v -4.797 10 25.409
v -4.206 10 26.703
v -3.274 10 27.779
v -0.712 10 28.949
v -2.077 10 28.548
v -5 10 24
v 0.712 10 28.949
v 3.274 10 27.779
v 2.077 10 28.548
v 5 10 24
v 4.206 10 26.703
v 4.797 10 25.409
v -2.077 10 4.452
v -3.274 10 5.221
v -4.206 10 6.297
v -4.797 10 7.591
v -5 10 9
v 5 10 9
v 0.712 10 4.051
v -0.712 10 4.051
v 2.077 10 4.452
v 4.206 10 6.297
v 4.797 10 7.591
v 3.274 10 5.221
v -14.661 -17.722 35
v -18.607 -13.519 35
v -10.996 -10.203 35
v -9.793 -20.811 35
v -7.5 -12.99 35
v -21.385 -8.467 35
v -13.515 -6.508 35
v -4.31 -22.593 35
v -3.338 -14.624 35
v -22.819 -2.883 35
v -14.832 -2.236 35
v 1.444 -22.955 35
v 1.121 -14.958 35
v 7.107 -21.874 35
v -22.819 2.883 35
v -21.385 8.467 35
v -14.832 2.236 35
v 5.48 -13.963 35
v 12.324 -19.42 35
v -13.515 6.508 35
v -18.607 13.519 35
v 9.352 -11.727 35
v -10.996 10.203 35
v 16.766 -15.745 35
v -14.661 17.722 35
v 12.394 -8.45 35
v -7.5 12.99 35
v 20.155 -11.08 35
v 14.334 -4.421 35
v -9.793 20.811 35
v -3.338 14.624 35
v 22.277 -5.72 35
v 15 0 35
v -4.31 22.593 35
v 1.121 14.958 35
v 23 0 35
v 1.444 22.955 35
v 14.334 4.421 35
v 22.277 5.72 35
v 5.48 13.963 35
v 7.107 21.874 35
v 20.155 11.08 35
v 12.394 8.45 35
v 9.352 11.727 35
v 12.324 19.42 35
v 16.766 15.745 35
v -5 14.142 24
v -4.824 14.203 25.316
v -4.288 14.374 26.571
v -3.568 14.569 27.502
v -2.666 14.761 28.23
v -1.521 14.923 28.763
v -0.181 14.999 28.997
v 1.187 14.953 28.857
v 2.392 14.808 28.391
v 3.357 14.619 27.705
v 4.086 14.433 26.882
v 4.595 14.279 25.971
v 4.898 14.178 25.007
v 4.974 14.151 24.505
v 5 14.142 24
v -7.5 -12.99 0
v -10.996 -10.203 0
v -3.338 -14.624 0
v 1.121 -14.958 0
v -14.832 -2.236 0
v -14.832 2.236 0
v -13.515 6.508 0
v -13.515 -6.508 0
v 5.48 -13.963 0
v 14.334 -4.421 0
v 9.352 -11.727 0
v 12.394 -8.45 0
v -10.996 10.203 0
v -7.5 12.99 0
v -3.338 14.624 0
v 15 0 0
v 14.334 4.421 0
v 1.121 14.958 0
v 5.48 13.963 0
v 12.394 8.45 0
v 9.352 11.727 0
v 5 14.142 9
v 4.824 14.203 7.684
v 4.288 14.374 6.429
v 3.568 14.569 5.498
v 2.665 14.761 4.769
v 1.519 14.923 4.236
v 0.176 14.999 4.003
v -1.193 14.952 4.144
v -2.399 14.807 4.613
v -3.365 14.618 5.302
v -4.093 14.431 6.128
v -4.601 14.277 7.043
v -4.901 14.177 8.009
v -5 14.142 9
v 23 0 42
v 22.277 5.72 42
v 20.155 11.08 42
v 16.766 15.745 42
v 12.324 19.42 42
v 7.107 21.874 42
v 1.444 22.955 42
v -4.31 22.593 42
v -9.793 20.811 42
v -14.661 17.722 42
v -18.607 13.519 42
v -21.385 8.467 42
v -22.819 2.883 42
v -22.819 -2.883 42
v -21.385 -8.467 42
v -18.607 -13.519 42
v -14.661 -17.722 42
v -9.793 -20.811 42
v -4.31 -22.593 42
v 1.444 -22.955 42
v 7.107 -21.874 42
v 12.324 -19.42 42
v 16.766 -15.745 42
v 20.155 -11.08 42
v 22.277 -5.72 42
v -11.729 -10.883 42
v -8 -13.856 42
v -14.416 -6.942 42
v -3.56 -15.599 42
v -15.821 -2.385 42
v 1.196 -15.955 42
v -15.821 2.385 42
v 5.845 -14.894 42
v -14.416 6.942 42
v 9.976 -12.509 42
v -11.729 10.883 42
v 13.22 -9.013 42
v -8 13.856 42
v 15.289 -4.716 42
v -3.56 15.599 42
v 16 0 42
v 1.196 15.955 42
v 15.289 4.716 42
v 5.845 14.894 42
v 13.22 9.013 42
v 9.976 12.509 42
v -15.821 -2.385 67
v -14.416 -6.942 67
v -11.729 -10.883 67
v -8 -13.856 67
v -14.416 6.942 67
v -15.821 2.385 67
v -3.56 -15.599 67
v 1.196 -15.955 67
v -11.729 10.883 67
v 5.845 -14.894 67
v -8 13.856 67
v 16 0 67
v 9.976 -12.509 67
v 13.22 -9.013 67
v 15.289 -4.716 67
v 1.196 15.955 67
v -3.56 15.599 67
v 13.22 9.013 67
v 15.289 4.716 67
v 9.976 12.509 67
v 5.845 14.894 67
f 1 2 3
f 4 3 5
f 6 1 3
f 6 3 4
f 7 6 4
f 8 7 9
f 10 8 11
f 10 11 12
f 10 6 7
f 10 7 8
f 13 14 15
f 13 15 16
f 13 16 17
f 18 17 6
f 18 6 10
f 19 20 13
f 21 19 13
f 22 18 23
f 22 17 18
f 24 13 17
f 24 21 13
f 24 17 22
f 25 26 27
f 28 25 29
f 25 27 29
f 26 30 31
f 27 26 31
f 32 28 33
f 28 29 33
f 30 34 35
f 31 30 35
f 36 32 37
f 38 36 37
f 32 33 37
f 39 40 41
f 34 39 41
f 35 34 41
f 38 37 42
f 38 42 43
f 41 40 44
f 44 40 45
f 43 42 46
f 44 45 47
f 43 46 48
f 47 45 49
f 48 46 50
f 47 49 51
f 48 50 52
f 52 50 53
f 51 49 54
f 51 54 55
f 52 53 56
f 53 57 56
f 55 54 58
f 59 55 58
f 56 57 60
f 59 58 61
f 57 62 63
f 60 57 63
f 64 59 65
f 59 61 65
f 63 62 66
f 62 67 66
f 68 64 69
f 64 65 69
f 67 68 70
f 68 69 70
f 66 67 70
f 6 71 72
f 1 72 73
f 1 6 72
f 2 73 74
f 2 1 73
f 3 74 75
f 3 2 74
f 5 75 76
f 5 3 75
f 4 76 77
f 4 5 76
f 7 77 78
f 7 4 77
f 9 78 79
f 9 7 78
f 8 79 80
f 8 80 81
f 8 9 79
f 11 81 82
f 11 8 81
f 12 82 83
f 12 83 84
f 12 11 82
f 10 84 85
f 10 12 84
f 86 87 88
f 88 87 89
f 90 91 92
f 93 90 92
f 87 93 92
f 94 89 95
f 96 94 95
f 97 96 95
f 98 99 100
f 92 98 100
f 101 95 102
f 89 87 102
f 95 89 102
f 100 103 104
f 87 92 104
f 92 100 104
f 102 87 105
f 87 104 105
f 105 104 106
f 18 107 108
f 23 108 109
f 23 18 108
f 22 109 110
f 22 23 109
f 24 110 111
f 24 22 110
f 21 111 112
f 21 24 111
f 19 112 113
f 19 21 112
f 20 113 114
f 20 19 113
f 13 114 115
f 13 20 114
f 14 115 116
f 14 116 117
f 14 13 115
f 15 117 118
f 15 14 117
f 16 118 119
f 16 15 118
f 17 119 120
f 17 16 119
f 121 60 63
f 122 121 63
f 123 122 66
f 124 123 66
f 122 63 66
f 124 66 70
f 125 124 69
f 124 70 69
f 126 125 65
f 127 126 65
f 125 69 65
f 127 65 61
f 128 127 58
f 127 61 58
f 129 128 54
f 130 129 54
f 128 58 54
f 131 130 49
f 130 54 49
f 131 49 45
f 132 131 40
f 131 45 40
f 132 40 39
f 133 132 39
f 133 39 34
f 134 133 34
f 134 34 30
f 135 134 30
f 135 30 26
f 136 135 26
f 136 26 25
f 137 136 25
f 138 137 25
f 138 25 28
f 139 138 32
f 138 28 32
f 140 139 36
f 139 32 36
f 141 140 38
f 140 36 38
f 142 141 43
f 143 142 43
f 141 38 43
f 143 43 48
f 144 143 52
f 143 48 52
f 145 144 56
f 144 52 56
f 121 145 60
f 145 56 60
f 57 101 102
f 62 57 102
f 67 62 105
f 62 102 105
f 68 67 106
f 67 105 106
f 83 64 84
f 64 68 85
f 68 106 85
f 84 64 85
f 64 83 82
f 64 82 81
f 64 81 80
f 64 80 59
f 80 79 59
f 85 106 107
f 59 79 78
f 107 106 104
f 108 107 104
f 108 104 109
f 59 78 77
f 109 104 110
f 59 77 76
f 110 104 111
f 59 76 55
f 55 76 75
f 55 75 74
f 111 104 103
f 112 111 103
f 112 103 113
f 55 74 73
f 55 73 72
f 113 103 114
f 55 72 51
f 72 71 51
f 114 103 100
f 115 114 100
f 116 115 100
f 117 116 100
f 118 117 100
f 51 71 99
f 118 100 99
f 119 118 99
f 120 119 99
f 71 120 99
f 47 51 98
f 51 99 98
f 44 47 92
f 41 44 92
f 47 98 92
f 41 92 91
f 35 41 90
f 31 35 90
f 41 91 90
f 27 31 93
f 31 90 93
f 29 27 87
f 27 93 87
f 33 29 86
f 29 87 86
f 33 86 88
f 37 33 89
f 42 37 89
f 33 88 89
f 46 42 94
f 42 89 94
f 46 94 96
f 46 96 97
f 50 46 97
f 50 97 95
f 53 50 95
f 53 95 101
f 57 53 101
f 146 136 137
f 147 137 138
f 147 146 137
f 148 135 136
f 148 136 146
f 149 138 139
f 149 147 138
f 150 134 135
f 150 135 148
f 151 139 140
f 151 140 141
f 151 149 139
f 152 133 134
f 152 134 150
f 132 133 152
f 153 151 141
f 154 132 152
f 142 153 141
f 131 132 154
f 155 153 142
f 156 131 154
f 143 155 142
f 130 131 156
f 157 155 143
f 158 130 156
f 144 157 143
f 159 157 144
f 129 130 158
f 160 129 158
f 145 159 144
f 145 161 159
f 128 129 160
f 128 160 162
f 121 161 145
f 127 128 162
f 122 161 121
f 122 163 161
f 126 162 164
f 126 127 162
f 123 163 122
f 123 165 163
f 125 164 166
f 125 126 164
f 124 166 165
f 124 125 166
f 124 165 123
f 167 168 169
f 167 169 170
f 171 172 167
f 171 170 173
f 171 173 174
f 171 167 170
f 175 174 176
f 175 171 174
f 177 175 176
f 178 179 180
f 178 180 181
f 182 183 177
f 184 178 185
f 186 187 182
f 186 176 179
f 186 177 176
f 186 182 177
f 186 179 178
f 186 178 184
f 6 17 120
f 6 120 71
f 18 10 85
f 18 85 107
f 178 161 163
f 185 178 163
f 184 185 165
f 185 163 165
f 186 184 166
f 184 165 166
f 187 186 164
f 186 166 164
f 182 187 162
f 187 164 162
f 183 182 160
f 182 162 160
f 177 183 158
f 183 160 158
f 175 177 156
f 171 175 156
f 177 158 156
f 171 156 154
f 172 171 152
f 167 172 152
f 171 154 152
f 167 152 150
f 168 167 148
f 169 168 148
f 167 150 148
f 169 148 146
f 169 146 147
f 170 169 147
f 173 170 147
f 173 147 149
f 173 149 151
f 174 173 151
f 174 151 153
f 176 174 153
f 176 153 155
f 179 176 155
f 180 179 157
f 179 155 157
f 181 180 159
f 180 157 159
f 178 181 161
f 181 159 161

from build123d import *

# Parameters (mm, degrees)
SKETCH1_R           = 15
BOSS_EXTRUDE1_DEPTH = 35
SKETCH2_R           = 23
BOSS_EXTRUDE2_DEPTH = 7
SKETCH3_R           = 16
BOSS_EXTRUDE3_DEPTH = 25
CUT_EXTRUDE1_DEPTH  = 25


with BuildPart() as part:
    # Sketch1 → Boss-Extrude1 (new body)
    with BuildSketch(Plane.XY):
        Circle(SKETCH1_R)
    extrude(amount=BOSS_EXTRUDE1_DEPTH)

    # Sketch2 → Boss-Extrude2 (add)
    with BuildSketch(Plane.XY.offset(35)):
        Circle(SKETCH2_R)
    extrude(amount=BOSS_EXTRUDE2_DEPTH)

    # Sketch3 → Boss-Extrude3 (add)
    with BuildSketch(Plane.XY.offset(42)):
        Circle(SKETCH3_R)
    extrude(amount=BOSS_EXTRUDE3_DEPTH)

    # Sketch4 → Cut-Extrude1 (cut)
    with BuildSketch(Plane(origin=(0, 10, 0), x_dir=(1, 0, 0), z_dir=(0, 1, 0))):
        with BuildLine():
            Line((5, -24), (5, -9))
            ThreePointArc((5, -9), (0, -4), (-5, -9))
            Line((-5, -9), (-5, -24))
            ThreePointArc((-5, -24), (0, -29), (5, -24))
        make_face()
    extrude(amount=CUT_EXTRUDE1_DEPTH, mode=Mode.SUBTRACT)


solid = part.part
